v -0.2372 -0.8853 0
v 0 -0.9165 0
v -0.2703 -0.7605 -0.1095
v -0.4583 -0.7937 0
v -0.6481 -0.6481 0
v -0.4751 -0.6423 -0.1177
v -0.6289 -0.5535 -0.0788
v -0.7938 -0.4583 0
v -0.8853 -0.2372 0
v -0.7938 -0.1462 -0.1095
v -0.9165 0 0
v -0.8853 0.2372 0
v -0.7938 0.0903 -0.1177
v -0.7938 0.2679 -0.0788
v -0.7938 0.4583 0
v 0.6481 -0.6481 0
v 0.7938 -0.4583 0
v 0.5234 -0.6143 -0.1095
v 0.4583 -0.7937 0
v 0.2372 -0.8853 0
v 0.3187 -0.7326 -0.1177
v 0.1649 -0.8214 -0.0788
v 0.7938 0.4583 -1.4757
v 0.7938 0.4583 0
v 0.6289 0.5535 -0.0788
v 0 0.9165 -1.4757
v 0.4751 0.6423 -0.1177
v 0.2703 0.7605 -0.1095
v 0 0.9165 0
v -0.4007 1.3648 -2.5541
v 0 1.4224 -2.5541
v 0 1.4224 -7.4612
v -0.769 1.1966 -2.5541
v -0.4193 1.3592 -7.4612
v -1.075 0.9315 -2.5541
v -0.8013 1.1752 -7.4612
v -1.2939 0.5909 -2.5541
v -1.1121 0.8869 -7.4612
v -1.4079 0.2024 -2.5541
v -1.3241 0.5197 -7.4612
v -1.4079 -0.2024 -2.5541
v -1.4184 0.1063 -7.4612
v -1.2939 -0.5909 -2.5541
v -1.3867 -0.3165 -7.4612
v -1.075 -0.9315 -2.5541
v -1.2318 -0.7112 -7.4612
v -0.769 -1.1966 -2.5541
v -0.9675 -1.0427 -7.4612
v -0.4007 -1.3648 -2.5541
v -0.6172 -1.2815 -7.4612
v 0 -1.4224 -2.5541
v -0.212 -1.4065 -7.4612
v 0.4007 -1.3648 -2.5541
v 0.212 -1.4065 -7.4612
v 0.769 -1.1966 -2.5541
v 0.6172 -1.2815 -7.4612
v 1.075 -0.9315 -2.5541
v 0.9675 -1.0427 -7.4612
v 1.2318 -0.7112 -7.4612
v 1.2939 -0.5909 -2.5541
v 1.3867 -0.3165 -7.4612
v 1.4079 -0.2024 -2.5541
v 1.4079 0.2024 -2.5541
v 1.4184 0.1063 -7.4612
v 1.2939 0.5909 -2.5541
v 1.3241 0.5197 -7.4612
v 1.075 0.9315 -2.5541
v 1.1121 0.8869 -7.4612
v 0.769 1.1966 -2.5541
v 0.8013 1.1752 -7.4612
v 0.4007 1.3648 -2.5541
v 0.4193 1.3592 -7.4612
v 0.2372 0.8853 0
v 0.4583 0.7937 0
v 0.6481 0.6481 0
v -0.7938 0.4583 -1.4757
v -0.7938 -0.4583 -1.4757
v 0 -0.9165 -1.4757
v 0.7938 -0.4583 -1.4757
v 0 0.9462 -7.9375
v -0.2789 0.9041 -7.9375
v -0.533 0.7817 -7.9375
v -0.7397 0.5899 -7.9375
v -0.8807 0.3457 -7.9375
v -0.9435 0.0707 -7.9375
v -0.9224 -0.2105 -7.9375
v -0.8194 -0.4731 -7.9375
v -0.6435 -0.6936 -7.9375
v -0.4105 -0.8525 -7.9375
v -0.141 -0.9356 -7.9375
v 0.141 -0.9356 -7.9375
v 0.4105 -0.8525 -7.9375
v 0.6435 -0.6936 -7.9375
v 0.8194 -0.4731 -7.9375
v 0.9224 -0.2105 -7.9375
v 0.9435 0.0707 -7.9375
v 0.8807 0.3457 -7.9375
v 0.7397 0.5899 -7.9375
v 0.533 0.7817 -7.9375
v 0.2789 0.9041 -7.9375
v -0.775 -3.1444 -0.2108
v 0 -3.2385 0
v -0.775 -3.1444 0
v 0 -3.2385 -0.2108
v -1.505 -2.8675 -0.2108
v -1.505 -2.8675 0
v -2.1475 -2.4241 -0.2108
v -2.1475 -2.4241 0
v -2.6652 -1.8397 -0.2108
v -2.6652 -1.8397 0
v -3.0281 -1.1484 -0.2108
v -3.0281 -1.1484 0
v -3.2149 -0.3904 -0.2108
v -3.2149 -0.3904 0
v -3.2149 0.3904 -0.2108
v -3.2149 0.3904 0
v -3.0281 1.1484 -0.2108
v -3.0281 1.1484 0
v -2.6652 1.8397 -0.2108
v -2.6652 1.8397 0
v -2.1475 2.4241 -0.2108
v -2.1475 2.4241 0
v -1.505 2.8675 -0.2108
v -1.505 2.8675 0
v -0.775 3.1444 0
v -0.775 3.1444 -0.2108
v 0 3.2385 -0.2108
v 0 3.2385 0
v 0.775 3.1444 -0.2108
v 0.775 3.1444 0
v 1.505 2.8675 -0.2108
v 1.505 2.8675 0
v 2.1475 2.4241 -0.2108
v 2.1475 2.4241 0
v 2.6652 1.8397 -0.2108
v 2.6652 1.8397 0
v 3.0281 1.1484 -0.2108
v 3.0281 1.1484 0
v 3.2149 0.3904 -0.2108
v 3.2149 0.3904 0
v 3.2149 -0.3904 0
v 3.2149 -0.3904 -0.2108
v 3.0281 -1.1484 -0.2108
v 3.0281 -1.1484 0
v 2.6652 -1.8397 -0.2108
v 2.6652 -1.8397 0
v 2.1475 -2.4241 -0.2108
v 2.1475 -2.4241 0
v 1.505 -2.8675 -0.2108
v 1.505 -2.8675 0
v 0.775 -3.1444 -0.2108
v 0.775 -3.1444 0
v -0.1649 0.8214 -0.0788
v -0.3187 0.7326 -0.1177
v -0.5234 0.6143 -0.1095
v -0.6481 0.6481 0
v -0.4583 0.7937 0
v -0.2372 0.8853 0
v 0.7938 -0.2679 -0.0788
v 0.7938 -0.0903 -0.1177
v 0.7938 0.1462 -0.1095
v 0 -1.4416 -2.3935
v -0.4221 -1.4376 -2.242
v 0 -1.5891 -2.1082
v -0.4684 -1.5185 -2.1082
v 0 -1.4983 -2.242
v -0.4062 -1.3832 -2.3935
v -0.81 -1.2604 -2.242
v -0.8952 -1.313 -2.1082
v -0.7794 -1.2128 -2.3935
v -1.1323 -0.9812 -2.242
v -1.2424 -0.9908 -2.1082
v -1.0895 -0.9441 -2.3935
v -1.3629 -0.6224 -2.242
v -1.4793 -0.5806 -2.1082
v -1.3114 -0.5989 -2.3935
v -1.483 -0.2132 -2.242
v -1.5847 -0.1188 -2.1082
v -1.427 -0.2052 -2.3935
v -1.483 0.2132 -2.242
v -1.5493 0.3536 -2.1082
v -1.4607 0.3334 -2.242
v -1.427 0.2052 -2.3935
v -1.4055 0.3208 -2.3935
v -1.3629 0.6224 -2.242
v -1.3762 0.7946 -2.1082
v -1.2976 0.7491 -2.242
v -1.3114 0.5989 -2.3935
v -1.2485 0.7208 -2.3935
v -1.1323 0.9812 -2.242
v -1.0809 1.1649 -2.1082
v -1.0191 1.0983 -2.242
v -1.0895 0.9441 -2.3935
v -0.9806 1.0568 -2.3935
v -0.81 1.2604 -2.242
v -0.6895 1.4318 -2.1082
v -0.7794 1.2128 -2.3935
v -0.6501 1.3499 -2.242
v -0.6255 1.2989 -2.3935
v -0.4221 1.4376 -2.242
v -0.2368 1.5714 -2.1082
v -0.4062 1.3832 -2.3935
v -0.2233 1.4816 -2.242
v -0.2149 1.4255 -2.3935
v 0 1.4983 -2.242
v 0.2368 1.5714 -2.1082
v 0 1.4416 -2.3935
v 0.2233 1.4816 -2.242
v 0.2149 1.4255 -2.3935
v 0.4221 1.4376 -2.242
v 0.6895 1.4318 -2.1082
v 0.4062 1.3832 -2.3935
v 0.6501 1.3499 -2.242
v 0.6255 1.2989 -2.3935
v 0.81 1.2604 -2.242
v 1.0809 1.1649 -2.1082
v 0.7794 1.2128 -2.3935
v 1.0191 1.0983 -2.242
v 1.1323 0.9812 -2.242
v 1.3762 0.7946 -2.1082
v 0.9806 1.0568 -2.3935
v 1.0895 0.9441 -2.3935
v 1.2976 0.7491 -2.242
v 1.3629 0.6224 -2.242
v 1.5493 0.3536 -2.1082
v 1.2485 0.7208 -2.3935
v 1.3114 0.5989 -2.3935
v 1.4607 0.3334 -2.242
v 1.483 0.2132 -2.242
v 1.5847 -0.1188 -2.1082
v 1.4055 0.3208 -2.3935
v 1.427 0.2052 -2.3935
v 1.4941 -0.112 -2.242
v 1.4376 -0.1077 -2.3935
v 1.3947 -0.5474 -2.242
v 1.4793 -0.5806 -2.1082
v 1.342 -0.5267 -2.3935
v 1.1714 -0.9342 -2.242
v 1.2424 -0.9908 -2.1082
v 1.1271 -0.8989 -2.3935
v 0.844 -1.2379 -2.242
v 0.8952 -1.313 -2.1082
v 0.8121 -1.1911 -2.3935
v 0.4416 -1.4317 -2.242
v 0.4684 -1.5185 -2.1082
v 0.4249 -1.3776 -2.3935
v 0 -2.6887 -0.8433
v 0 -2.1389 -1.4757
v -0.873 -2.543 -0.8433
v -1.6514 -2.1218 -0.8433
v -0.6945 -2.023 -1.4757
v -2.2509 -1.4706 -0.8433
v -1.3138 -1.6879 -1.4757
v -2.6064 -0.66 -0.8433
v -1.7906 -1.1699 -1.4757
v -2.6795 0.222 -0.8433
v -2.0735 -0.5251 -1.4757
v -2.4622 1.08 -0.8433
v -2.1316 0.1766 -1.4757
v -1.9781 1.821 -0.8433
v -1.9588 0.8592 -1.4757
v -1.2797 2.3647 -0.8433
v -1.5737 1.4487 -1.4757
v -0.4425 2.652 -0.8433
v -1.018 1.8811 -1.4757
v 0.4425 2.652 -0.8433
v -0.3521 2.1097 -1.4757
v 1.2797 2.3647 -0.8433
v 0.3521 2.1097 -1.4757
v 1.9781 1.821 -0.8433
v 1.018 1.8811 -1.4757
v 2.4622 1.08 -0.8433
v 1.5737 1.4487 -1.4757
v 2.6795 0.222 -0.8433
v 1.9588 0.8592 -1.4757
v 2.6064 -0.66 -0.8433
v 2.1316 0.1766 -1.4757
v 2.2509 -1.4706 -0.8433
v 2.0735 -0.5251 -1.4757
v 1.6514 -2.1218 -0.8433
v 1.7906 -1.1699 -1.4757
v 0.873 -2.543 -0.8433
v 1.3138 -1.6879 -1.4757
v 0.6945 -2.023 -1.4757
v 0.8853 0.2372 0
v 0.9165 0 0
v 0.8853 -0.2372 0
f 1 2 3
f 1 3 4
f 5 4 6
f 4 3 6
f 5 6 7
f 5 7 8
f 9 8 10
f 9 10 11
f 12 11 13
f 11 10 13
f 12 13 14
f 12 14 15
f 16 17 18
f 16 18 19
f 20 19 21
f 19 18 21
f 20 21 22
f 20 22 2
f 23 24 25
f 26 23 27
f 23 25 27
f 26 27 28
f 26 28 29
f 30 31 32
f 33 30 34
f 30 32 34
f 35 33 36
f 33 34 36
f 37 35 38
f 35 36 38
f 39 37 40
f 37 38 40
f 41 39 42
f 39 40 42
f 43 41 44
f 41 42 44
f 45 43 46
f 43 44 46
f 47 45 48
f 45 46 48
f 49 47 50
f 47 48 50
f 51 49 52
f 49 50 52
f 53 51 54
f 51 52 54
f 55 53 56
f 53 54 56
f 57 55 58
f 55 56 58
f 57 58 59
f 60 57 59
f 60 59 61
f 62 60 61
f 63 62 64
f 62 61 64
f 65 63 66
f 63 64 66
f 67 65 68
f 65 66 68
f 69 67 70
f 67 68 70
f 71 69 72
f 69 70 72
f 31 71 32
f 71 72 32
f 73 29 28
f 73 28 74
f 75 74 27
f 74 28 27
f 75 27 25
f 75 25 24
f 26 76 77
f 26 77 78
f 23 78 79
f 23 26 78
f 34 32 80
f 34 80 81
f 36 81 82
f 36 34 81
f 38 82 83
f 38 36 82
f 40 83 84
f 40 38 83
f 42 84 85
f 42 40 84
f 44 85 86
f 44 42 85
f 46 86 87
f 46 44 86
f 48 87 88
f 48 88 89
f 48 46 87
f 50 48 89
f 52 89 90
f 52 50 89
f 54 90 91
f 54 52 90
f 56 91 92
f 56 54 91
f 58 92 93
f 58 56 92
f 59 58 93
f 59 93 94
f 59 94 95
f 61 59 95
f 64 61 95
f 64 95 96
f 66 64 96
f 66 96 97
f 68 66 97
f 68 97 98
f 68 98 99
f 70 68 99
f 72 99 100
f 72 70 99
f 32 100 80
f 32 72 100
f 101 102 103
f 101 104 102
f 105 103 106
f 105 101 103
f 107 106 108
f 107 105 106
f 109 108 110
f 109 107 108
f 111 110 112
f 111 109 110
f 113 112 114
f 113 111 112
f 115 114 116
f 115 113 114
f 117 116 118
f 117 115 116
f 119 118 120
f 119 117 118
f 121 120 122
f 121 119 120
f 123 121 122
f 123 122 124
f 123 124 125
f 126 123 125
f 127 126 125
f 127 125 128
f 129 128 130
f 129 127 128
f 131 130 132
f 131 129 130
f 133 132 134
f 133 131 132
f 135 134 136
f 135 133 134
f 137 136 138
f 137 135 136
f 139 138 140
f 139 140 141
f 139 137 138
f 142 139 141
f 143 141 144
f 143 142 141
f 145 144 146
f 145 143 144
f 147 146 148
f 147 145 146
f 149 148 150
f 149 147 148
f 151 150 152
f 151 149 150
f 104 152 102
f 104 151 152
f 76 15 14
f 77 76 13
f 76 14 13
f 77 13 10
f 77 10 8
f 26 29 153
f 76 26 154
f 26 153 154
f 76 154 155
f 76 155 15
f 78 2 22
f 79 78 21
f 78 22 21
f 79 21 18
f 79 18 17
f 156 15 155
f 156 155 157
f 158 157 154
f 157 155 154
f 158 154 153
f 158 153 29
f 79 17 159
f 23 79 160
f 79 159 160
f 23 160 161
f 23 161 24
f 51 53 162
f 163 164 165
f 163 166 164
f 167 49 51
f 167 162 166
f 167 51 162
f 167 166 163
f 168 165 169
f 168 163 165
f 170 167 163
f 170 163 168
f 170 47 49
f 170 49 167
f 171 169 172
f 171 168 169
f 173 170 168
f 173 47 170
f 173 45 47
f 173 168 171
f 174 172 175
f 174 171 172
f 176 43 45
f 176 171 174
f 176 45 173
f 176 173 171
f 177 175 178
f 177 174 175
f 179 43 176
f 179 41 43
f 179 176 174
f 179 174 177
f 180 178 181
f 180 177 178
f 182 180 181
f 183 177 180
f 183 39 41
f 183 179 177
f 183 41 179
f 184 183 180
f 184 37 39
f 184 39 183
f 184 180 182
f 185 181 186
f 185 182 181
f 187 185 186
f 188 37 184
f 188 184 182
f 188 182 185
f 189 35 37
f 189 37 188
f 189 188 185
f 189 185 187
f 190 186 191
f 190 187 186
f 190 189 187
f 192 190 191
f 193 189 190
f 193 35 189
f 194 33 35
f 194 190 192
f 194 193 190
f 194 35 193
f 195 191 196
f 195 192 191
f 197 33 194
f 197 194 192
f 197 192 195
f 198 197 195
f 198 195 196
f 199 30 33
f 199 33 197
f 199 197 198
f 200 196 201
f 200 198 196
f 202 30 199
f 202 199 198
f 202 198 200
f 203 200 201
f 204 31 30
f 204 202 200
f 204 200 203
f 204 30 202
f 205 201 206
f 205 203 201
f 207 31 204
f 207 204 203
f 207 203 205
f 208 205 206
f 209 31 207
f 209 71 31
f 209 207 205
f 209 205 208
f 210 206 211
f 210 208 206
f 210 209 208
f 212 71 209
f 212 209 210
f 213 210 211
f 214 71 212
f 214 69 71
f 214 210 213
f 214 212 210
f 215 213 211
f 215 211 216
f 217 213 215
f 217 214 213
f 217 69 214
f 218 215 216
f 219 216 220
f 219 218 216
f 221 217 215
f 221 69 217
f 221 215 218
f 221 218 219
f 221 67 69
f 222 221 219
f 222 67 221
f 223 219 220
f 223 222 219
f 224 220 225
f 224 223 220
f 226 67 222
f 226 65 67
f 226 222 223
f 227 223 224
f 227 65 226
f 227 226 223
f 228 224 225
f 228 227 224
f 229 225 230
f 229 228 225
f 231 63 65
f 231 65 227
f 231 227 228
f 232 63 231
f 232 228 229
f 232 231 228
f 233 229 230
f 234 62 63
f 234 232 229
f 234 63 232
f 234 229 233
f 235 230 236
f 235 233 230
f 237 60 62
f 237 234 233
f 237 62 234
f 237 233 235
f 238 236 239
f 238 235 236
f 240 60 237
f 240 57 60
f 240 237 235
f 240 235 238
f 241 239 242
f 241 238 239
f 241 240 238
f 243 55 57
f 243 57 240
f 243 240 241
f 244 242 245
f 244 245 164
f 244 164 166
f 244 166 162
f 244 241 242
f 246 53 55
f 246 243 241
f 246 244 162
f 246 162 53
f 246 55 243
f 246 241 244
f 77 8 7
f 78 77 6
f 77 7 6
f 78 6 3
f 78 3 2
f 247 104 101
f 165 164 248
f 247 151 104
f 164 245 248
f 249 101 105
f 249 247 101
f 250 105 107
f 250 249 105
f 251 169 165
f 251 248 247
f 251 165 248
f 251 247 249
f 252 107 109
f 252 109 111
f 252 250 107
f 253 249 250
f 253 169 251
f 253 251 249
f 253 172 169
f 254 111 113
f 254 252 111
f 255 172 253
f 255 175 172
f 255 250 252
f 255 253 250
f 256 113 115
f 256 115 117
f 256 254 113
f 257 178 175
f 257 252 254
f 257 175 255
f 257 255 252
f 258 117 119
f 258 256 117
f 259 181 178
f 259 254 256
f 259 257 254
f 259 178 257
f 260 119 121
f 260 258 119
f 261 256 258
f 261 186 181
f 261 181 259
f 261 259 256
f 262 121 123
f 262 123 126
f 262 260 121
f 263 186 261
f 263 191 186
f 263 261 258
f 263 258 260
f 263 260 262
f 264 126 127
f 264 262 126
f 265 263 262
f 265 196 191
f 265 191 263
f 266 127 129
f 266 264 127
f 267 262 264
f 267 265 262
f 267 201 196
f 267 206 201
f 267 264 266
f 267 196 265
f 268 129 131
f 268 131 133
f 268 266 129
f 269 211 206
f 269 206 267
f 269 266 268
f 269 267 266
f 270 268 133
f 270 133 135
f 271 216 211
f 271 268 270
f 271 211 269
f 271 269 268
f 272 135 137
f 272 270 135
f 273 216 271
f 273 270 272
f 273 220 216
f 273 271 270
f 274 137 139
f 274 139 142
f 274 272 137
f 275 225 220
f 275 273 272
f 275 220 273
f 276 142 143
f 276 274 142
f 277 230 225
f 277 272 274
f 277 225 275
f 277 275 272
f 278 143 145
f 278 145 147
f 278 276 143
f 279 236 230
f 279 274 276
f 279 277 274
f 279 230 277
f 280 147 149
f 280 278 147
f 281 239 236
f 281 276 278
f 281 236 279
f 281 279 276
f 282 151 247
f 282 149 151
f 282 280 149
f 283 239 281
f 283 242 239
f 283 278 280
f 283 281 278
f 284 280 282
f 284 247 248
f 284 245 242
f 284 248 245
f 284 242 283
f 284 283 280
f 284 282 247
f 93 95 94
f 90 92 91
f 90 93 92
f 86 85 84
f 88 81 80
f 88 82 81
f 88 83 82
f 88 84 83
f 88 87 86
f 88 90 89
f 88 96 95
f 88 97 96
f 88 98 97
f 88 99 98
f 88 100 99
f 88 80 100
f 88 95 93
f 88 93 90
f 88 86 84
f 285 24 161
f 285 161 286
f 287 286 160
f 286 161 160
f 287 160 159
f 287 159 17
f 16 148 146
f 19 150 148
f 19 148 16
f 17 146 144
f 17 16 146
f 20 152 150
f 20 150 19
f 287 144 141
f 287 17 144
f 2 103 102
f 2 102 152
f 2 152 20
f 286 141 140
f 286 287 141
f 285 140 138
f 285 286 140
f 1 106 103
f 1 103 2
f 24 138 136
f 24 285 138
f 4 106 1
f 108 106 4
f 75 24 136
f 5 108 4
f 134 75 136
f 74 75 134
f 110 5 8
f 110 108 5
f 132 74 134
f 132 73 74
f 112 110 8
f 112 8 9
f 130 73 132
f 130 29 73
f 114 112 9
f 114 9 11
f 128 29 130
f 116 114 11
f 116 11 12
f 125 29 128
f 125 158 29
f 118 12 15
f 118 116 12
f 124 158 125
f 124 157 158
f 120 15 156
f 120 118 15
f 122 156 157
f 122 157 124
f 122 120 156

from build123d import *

# Parameters (mm, degrees)
SKETCH1_W          = 7.9375
SKETCH1_H          = 1.4224
CHAMFER1_SIZE      = 0.47625
CUT_EXTRUDE2_DEPTH = 1.47574


with BuildPart() as part:
    # Sketch1 → Revolve1 (revolve)
    with BuildSketch(Plane(origin=(0, 0, 0), x_dir=(0, 0, -1), z_dir=(1, 0, 0))):
        with Locations((3.96875, 0.7112)):
            Rectangle(SKETCH1_W, SKETCH1_H)
    revolve(axis=Axis((0, 0, -7.9375), (0, 0, 1)))

    # Chamfer1
    chamfer1_edges = [part.edges().sort_by_distance(p)[0] for p in [
        (0, -1.4224, -7.9375),
    ]]
    chamfer(chamfer1_edges, length=CHAMFER1_SIZE)


with BuildPart() as body_2:
    # Sketch7 → Revolve2 (revolve)
    with BuildSketch(Plane(origin=(0, 0, 0), x_dir=(0, 0, -1), z_dir=(1, 0, 0)), mode=Mode.PRIVATE) as revolve2_sk:
        with BuildLine():
            Line((0, 3.2385), (0.21082, 3.2385))
            Line((0.21082, 3.2385), (2.1082, 1.589132729))
            ThreePointArc((2.1082, 1.589132729), (2.316098376, 1.465446193), (2.554146942, 1.4224))
            Line((2.554146942, 1.4224), (2.554146942, 0))
            Line((2.554146942, 0), (0, 0))
            Line((0, 0), (0, 3.2385))
        make_face()
    revolve(revolve2_sk.sketch.rotate(Axis((0, 0, 0), (0, 0, -1)), 180), axis=Axis((0, 0, 0), (0, 0, -1)))

    # Boss-Extrude1 cone 1 section (through the dimple's axis) → Boss-Extrude1 (revolve)
    with BuildSketch(Plane(origin=(0, 0, -2.554146942), x_dir=(0, -1, 0), z_dir=(1, 0, 0))):
        Polygon((0, 0), (1.4224, 0), (0, 1.4224), align=None)
    revolve(axis=Axis((0, 0, -2.554146942), (0, 0, -1)))

    # Combine1: union part
    add(part.part)

    # Sketch5 → Cut-Extrude2 (cut)
    with BuildSketch(Plane.XY):
        Polygon((0.79375, -0.458271776), (0.79375, 0.458271776), (0, 0.916543552), (-0.79375, 0.458271776), (-0.79375, -0.458271776), (0, -0.916543552), align=None)
    extrude(amount=-CUT_EXTRUDE2_DEPTH, mode=Mode.SUBTRACT)

    # Cut-Extrude3 cone 1 section (through the dimple's axis) → Cut-Extrude3 (revolve, cut)
    with BuildSketch(Plane(origin=(0, 0, 0), x_dir=(0, -1, 0), z_dir=(1, 0, 0))):
        Polygon((0, 0), (0.916543552, 0), (0, 0.916543552), align=None)
    revolve(axis=Axis((0, 0, 0), (0, 0, -1)), mode=Mode.SUBTRACT)


solid = body_2.part
